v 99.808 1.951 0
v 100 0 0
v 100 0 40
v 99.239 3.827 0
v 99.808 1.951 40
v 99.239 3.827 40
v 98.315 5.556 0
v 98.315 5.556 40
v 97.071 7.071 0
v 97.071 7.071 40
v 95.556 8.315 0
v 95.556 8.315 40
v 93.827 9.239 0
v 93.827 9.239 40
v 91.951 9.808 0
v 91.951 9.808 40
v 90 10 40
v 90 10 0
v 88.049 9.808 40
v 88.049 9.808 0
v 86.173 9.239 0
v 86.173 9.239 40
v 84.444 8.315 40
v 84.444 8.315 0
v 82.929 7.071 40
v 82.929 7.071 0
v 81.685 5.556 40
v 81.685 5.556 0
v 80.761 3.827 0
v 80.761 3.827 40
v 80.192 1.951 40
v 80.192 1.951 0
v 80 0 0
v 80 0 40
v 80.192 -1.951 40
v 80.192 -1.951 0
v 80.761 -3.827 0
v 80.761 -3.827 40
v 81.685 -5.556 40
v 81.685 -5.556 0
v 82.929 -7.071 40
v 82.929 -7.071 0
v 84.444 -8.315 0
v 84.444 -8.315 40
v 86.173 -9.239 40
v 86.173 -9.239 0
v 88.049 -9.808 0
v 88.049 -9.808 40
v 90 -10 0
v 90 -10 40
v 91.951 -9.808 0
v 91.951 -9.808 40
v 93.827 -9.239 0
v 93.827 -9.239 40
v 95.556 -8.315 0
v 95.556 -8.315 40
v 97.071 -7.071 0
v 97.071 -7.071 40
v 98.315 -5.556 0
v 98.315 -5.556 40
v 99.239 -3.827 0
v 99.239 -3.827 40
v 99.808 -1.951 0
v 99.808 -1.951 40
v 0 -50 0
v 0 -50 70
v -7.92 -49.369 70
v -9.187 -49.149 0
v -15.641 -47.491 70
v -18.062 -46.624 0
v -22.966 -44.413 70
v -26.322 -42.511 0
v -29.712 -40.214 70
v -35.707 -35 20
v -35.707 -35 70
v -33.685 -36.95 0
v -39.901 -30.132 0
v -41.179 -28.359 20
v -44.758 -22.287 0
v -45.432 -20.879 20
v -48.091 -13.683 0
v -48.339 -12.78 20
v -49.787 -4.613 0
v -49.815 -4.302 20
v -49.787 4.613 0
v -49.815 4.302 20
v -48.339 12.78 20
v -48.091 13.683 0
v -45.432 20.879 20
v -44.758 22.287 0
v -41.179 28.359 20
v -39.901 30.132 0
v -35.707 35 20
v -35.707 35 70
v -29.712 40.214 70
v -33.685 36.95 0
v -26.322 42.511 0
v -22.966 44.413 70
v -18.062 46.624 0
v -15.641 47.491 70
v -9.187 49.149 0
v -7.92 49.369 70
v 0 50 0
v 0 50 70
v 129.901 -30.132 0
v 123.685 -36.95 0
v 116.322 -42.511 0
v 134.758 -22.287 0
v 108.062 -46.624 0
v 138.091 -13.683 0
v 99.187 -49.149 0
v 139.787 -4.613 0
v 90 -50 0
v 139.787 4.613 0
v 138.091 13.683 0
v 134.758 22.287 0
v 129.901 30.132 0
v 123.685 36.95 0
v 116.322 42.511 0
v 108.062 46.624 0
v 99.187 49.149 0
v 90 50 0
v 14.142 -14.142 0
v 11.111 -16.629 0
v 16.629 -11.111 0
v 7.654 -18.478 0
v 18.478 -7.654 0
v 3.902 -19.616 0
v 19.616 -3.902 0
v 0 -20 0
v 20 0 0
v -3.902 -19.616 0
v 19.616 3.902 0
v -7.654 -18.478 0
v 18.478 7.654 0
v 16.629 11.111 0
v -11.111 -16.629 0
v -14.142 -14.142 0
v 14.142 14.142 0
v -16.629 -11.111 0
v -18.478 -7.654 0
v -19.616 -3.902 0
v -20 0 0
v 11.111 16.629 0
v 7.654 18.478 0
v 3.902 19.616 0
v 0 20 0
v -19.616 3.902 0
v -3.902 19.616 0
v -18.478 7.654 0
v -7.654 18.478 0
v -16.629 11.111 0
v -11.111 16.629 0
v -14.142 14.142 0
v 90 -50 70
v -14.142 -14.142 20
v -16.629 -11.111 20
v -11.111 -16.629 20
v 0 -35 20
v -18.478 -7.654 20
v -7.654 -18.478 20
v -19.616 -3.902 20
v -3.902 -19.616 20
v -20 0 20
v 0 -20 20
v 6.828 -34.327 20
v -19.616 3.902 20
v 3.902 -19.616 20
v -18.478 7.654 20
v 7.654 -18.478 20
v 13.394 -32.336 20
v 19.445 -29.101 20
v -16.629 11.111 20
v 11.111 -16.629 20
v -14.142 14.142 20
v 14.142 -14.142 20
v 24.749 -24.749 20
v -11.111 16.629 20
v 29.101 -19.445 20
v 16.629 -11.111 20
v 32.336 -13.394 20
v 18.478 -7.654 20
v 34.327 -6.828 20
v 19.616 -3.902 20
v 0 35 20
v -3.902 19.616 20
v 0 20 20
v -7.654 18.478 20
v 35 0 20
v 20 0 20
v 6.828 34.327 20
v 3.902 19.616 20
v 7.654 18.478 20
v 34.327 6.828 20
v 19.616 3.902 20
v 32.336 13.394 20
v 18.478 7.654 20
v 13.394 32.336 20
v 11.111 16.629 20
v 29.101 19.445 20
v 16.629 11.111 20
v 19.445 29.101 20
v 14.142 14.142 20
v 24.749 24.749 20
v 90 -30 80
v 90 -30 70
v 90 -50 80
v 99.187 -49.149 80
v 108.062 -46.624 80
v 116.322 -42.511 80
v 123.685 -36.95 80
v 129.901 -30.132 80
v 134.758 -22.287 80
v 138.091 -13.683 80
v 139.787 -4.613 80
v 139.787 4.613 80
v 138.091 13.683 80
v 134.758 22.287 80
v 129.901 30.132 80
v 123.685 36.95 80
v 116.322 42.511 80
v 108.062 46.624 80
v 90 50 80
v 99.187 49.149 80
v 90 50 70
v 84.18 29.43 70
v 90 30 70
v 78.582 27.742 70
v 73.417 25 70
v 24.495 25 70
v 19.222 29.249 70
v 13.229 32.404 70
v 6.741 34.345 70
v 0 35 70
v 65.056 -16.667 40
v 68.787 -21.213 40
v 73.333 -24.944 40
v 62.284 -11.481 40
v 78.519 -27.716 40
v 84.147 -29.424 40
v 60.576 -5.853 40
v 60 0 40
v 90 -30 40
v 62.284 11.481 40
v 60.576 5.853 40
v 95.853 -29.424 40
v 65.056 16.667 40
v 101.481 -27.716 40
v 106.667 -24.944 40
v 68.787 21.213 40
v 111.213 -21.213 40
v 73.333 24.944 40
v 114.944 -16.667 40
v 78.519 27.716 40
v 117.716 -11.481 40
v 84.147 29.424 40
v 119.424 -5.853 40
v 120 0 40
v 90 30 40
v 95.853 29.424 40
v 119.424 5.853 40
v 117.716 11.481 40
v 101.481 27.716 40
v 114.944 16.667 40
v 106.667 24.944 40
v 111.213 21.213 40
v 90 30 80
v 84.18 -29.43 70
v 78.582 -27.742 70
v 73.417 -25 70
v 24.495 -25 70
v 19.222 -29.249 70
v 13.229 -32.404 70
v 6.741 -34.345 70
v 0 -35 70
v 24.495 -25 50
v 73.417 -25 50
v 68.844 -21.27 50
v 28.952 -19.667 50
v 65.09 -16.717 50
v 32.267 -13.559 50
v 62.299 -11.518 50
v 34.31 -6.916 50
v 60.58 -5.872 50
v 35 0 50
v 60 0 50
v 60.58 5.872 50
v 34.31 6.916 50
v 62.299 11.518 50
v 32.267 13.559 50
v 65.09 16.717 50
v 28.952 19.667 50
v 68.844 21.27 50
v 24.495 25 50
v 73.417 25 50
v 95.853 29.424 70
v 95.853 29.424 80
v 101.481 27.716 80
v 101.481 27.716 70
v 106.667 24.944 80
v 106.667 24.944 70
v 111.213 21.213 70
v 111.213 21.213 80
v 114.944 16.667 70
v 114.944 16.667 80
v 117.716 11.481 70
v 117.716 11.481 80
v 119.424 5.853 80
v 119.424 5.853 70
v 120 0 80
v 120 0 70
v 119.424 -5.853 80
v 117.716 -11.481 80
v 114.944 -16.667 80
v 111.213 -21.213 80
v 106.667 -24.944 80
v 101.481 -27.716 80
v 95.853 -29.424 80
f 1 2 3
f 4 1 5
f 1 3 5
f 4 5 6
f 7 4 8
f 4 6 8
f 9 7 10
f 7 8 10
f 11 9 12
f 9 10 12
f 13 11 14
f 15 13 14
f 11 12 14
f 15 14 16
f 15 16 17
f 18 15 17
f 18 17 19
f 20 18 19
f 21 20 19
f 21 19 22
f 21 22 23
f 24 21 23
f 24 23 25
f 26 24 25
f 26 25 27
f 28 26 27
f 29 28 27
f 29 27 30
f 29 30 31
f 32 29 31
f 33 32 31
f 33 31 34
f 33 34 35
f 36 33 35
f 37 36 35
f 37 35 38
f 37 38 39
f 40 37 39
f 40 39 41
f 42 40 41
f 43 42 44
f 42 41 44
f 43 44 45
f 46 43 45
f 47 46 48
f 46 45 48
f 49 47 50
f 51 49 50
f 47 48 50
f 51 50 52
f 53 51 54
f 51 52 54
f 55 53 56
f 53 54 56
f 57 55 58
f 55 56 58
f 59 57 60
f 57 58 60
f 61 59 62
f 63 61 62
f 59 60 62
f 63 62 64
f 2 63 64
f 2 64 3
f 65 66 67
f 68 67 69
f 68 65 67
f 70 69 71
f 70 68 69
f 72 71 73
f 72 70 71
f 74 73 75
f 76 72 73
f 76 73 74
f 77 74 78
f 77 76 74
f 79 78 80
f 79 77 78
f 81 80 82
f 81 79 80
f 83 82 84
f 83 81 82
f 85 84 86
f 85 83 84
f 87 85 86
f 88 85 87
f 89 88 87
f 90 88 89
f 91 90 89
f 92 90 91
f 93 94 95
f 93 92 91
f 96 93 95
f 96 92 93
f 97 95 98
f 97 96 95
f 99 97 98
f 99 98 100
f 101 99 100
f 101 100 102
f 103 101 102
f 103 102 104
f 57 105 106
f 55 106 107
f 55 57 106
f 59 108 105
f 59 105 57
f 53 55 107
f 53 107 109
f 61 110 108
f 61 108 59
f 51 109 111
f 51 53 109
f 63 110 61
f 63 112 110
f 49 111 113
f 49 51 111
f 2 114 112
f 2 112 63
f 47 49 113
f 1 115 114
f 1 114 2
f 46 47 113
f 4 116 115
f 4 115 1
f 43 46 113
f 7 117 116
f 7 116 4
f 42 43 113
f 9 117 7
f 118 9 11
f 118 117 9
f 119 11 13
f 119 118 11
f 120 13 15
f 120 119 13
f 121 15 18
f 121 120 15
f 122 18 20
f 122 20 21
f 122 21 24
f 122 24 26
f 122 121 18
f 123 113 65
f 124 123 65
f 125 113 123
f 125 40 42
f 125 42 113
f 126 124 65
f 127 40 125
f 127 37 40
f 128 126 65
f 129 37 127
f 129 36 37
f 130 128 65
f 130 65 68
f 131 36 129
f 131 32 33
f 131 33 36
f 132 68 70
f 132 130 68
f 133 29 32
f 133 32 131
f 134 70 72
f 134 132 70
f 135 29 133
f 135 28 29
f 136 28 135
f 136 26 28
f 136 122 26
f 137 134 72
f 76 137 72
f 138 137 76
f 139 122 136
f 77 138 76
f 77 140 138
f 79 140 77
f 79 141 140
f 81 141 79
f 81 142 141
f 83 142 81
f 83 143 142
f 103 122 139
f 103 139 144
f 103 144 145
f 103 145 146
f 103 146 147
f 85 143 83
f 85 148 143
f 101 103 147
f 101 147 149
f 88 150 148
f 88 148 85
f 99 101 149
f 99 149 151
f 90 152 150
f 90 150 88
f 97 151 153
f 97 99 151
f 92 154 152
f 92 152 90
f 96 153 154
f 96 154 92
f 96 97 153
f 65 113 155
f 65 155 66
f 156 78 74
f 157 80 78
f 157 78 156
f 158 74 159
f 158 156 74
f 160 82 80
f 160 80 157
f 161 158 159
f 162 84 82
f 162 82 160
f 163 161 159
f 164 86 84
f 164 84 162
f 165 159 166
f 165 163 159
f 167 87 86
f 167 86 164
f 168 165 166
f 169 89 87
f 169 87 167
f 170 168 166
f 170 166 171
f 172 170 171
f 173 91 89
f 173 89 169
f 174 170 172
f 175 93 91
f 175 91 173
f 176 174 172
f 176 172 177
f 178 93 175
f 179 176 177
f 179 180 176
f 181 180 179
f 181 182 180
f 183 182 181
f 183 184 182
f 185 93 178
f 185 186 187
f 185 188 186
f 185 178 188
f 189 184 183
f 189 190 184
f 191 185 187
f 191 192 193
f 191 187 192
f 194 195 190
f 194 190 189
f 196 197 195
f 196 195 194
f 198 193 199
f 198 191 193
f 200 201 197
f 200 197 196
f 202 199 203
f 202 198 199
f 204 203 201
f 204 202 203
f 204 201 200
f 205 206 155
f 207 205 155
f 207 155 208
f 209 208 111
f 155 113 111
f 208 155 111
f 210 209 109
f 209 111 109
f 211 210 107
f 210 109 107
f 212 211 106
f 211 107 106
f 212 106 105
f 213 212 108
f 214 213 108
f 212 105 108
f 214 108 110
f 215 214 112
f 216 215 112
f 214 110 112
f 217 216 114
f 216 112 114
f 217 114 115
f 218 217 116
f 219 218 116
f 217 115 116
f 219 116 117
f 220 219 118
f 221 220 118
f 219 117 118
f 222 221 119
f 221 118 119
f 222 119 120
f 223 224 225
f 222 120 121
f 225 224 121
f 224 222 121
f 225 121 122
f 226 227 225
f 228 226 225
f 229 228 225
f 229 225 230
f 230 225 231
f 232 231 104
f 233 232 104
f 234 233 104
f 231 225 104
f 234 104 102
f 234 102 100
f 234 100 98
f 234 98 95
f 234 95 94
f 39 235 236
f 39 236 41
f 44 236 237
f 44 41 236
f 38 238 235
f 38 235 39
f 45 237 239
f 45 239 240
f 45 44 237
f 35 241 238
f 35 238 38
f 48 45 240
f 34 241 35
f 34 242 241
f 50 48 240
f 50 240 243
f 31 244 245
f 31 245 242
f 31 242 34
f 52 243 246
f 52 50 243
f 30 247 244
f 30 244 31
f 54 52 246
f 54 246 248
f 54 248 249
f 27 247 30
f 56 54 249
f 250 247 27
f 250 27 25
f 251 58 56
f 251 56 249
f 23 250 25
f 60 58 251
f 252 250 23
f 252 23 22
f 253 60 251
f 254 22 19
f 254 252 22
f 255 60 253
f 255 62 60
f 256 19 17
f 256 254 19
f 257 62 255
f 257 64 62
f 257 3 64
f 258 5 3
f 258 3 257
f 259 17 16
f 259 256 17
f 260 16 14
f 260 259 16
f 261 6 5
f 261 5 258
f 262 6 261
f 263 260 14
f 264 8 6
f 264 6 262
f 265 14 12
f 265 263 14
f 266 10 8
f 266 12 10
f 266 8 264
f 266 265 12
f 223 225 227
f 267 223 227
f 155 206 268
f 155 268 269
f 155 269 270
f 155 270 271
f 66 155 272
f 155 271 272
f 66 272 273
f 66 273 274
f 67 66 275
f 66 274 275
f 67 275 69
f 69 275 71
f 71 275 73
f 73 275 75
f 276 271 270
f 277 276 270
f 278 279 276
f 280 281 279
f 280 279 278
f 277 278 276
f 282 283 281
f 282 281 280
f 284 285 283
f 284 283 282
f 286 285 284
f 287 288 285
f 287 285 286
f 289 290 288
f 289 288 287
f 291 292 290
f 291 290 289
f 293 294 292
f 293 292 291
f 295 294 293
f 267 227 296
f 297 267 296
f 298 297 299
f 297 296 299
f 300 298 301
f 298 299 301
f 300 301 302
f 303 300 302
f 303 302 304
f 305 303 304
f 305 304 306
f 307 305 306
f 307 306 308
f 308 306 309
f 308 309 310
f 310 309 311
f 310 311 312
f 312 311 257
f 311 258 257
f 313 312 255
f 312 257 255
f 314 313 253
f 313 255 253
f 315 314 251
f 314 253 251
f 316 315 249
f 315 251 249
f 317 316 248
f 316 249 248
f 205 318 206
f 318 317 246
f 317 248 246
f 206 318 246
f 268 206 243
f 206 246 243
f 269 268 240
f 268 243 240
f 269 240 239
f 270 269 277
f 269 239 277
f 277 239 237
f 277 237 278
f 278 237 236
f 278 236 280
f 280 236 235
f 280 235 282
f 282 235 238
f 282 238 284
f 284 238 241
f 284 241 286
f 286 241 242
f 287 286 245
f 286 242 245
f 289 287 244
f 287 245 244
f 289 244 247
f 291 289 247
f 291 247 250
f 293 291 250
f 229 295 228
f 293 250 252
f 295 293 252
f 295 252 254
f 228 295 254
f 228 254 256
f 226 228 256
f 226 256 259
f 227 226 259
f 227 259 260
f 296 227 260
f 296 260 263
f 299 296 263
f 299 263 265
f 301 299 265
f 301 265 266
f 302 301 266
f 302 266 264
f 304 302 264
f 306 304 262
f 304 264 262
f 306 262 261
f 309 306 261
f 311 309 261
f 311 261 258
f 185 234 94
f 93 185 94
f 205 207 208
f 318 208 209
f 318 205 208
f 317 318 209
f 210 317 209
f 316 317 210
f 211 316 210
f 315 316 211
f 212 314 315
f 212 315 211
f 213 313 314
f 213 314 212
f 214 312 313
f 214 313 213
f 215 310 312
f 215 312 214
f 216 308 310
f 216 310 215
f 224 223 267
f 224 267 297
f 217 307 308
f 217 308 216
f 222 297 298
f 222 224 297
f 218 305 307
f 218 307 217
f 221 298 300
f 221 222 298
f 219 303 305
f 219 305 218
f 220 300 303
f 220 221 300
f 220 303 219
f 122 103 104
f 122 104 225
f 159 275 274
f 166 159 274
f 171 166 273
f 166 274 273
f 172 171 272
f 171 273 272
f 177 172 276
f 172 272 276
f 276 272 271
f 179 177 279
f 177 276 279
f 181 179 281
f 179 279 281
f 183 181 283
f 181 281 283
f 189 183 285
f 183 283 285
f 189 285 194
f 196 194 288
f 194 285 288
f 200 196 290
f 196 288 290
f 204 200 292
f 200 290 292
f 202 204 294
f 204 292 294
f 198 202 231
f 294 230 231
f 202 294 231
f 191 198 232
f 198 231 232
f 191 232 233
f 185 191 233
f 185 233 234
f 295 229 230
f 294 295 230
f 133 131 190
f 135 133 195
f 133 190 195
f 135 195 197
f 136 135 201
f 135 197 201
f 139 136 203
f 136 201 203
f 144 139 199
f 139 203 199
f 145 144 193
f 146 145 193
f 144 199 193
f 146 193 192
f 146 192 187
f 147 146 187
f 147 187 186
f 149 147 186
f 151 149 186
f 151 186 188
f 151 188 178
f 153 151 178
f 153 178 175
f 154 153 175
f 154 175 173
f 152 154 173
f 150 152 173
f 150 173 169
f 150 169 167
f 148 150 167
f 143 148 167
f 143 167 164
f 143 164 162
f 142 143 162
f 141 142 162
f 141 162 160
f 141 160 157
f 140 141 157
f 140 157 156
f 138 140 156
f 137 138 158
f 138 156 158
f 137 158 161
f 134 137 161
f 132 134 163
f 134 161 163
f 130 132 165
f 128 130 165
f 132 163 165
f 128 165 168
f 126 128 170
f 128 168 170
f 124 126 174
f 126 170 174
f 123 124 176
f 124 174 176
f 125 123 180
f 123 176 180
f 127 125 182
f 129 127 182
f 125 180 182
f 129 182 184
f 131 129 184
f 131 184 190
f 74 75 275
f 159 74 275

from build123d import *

# Parameters (mm, degrees)
BOSS_EXTRUDE1_DEPTH = 70
BOSS_EXTRUDE2_DEPTH = 10
SKETCH3_R           = 30
CUT_EXTRUDE1_DEPTH  = 30
SKETCH4_R           = 10
CUT_EXTRUDE2_DEPTH  = 71
CUT_EXTRUDE6_DEPTH  = 50
SKETCH9_R           = 20
CUT_EXTRUDE7_DEPTH  = 50
CUT_EXTRUDE8_DEPTH  = 20


with BuildPart() as part:
    # Sketch1 → Boss-Extrude1 (new body)
    with BuildSketch(Plane.XY):
        with BuildLine():
            Line((0, 50), (90, 50))
            ThreePointArc((90, 50), (140, 0), (90, -50))
            Line((90, -50), (0, -50))
            ThreePointArc((0, -50), (-50, 0), (0, 50))
        make_face()
    extrude(amount=BOSS_EXTRUDE1_DEPTH)

    # Sketch2 → Boss-Extrude2 (add)
    with BuildSketch(Plane.XY.offset(70)):
        with BuildLine():
            Line((90, 50), (90, 30))
            ThreePointArc((90, 30), (120, 0), (90, -30))
            Line((90, -30), (90, -50))
            ThreePointArc((90, -50), (140, 0), (90, 50))
        make_face()
    extrude(amount=BOSS_EXTRUDE2_DEPTH)

    # Sketch3 → Cut-Extrude1 (cut)
    with BuildSketch(Plane.XY.offset(70)):
        with Locations((90, 0)):
            Circle(SKETCH3_R)
    extrude(amount=-CUT_EXTRUDE1_DEPTH, mode=Mode.SUBTRACT)

    # Sketch4 → Cut-Extrude2 (cut)
    with BuildSketch(Plane.XY.offset(40)):
        with Locations((90, 0)):
            Circle(SKETCH4_R)
    extrude(amount=-CUT_EXTRUDE2_DEPTH, mode=Mode.SUBTRACT)

    # Sketch5 → Cut-Extrude6 (cut)
    with BuildSketch(Plane.XY.offset(70)):
        with BuildLine():
            Line((0, 35), (-35.707142143, 35))
            ThreePointArc((-35.707142143, 35), (-50, 0), (-35.707142143, -35))
            Line((-35.707142143, -35), (0, -35))
            ThreePointArc((0, -35), (35, 0), (0, 35))
        make_face()
    extrude(amount=-CUT_EXTRUDE6_DEPTH, mode=Mode.SUBTRACT)

    # Sketch9 → Cut-Extrude7 (cut)
    with BuildSketch(Plane.XY.offset(20)):
        Circle(SKETCH9_R)
    extrude(amount=-CUT_EXTRUDE7_DEPTH, mode=Mode.SUBTRACT)

    # Sketch10 → Cut-Extrude8 (cut)
    with BuildSketch(Plane.XY.offset(70)):
        with BuildLine():
            ThreePointArc((73.416876048, -25), (60, 0), (73.416876048, 25))
            Line((73.416876048, 25), (24.494897428, 25))
            ThreePointArc((24.494897428, 25), (35, 0), (24.494897428, -25))
            Line((24.494897428, -25), (73.416876048, -25))
        make_face()
    extrude(amount=-CUT_EXTRUDE8_DEPTH, mode=Mode.SUBTRACT)


solid = part.part
